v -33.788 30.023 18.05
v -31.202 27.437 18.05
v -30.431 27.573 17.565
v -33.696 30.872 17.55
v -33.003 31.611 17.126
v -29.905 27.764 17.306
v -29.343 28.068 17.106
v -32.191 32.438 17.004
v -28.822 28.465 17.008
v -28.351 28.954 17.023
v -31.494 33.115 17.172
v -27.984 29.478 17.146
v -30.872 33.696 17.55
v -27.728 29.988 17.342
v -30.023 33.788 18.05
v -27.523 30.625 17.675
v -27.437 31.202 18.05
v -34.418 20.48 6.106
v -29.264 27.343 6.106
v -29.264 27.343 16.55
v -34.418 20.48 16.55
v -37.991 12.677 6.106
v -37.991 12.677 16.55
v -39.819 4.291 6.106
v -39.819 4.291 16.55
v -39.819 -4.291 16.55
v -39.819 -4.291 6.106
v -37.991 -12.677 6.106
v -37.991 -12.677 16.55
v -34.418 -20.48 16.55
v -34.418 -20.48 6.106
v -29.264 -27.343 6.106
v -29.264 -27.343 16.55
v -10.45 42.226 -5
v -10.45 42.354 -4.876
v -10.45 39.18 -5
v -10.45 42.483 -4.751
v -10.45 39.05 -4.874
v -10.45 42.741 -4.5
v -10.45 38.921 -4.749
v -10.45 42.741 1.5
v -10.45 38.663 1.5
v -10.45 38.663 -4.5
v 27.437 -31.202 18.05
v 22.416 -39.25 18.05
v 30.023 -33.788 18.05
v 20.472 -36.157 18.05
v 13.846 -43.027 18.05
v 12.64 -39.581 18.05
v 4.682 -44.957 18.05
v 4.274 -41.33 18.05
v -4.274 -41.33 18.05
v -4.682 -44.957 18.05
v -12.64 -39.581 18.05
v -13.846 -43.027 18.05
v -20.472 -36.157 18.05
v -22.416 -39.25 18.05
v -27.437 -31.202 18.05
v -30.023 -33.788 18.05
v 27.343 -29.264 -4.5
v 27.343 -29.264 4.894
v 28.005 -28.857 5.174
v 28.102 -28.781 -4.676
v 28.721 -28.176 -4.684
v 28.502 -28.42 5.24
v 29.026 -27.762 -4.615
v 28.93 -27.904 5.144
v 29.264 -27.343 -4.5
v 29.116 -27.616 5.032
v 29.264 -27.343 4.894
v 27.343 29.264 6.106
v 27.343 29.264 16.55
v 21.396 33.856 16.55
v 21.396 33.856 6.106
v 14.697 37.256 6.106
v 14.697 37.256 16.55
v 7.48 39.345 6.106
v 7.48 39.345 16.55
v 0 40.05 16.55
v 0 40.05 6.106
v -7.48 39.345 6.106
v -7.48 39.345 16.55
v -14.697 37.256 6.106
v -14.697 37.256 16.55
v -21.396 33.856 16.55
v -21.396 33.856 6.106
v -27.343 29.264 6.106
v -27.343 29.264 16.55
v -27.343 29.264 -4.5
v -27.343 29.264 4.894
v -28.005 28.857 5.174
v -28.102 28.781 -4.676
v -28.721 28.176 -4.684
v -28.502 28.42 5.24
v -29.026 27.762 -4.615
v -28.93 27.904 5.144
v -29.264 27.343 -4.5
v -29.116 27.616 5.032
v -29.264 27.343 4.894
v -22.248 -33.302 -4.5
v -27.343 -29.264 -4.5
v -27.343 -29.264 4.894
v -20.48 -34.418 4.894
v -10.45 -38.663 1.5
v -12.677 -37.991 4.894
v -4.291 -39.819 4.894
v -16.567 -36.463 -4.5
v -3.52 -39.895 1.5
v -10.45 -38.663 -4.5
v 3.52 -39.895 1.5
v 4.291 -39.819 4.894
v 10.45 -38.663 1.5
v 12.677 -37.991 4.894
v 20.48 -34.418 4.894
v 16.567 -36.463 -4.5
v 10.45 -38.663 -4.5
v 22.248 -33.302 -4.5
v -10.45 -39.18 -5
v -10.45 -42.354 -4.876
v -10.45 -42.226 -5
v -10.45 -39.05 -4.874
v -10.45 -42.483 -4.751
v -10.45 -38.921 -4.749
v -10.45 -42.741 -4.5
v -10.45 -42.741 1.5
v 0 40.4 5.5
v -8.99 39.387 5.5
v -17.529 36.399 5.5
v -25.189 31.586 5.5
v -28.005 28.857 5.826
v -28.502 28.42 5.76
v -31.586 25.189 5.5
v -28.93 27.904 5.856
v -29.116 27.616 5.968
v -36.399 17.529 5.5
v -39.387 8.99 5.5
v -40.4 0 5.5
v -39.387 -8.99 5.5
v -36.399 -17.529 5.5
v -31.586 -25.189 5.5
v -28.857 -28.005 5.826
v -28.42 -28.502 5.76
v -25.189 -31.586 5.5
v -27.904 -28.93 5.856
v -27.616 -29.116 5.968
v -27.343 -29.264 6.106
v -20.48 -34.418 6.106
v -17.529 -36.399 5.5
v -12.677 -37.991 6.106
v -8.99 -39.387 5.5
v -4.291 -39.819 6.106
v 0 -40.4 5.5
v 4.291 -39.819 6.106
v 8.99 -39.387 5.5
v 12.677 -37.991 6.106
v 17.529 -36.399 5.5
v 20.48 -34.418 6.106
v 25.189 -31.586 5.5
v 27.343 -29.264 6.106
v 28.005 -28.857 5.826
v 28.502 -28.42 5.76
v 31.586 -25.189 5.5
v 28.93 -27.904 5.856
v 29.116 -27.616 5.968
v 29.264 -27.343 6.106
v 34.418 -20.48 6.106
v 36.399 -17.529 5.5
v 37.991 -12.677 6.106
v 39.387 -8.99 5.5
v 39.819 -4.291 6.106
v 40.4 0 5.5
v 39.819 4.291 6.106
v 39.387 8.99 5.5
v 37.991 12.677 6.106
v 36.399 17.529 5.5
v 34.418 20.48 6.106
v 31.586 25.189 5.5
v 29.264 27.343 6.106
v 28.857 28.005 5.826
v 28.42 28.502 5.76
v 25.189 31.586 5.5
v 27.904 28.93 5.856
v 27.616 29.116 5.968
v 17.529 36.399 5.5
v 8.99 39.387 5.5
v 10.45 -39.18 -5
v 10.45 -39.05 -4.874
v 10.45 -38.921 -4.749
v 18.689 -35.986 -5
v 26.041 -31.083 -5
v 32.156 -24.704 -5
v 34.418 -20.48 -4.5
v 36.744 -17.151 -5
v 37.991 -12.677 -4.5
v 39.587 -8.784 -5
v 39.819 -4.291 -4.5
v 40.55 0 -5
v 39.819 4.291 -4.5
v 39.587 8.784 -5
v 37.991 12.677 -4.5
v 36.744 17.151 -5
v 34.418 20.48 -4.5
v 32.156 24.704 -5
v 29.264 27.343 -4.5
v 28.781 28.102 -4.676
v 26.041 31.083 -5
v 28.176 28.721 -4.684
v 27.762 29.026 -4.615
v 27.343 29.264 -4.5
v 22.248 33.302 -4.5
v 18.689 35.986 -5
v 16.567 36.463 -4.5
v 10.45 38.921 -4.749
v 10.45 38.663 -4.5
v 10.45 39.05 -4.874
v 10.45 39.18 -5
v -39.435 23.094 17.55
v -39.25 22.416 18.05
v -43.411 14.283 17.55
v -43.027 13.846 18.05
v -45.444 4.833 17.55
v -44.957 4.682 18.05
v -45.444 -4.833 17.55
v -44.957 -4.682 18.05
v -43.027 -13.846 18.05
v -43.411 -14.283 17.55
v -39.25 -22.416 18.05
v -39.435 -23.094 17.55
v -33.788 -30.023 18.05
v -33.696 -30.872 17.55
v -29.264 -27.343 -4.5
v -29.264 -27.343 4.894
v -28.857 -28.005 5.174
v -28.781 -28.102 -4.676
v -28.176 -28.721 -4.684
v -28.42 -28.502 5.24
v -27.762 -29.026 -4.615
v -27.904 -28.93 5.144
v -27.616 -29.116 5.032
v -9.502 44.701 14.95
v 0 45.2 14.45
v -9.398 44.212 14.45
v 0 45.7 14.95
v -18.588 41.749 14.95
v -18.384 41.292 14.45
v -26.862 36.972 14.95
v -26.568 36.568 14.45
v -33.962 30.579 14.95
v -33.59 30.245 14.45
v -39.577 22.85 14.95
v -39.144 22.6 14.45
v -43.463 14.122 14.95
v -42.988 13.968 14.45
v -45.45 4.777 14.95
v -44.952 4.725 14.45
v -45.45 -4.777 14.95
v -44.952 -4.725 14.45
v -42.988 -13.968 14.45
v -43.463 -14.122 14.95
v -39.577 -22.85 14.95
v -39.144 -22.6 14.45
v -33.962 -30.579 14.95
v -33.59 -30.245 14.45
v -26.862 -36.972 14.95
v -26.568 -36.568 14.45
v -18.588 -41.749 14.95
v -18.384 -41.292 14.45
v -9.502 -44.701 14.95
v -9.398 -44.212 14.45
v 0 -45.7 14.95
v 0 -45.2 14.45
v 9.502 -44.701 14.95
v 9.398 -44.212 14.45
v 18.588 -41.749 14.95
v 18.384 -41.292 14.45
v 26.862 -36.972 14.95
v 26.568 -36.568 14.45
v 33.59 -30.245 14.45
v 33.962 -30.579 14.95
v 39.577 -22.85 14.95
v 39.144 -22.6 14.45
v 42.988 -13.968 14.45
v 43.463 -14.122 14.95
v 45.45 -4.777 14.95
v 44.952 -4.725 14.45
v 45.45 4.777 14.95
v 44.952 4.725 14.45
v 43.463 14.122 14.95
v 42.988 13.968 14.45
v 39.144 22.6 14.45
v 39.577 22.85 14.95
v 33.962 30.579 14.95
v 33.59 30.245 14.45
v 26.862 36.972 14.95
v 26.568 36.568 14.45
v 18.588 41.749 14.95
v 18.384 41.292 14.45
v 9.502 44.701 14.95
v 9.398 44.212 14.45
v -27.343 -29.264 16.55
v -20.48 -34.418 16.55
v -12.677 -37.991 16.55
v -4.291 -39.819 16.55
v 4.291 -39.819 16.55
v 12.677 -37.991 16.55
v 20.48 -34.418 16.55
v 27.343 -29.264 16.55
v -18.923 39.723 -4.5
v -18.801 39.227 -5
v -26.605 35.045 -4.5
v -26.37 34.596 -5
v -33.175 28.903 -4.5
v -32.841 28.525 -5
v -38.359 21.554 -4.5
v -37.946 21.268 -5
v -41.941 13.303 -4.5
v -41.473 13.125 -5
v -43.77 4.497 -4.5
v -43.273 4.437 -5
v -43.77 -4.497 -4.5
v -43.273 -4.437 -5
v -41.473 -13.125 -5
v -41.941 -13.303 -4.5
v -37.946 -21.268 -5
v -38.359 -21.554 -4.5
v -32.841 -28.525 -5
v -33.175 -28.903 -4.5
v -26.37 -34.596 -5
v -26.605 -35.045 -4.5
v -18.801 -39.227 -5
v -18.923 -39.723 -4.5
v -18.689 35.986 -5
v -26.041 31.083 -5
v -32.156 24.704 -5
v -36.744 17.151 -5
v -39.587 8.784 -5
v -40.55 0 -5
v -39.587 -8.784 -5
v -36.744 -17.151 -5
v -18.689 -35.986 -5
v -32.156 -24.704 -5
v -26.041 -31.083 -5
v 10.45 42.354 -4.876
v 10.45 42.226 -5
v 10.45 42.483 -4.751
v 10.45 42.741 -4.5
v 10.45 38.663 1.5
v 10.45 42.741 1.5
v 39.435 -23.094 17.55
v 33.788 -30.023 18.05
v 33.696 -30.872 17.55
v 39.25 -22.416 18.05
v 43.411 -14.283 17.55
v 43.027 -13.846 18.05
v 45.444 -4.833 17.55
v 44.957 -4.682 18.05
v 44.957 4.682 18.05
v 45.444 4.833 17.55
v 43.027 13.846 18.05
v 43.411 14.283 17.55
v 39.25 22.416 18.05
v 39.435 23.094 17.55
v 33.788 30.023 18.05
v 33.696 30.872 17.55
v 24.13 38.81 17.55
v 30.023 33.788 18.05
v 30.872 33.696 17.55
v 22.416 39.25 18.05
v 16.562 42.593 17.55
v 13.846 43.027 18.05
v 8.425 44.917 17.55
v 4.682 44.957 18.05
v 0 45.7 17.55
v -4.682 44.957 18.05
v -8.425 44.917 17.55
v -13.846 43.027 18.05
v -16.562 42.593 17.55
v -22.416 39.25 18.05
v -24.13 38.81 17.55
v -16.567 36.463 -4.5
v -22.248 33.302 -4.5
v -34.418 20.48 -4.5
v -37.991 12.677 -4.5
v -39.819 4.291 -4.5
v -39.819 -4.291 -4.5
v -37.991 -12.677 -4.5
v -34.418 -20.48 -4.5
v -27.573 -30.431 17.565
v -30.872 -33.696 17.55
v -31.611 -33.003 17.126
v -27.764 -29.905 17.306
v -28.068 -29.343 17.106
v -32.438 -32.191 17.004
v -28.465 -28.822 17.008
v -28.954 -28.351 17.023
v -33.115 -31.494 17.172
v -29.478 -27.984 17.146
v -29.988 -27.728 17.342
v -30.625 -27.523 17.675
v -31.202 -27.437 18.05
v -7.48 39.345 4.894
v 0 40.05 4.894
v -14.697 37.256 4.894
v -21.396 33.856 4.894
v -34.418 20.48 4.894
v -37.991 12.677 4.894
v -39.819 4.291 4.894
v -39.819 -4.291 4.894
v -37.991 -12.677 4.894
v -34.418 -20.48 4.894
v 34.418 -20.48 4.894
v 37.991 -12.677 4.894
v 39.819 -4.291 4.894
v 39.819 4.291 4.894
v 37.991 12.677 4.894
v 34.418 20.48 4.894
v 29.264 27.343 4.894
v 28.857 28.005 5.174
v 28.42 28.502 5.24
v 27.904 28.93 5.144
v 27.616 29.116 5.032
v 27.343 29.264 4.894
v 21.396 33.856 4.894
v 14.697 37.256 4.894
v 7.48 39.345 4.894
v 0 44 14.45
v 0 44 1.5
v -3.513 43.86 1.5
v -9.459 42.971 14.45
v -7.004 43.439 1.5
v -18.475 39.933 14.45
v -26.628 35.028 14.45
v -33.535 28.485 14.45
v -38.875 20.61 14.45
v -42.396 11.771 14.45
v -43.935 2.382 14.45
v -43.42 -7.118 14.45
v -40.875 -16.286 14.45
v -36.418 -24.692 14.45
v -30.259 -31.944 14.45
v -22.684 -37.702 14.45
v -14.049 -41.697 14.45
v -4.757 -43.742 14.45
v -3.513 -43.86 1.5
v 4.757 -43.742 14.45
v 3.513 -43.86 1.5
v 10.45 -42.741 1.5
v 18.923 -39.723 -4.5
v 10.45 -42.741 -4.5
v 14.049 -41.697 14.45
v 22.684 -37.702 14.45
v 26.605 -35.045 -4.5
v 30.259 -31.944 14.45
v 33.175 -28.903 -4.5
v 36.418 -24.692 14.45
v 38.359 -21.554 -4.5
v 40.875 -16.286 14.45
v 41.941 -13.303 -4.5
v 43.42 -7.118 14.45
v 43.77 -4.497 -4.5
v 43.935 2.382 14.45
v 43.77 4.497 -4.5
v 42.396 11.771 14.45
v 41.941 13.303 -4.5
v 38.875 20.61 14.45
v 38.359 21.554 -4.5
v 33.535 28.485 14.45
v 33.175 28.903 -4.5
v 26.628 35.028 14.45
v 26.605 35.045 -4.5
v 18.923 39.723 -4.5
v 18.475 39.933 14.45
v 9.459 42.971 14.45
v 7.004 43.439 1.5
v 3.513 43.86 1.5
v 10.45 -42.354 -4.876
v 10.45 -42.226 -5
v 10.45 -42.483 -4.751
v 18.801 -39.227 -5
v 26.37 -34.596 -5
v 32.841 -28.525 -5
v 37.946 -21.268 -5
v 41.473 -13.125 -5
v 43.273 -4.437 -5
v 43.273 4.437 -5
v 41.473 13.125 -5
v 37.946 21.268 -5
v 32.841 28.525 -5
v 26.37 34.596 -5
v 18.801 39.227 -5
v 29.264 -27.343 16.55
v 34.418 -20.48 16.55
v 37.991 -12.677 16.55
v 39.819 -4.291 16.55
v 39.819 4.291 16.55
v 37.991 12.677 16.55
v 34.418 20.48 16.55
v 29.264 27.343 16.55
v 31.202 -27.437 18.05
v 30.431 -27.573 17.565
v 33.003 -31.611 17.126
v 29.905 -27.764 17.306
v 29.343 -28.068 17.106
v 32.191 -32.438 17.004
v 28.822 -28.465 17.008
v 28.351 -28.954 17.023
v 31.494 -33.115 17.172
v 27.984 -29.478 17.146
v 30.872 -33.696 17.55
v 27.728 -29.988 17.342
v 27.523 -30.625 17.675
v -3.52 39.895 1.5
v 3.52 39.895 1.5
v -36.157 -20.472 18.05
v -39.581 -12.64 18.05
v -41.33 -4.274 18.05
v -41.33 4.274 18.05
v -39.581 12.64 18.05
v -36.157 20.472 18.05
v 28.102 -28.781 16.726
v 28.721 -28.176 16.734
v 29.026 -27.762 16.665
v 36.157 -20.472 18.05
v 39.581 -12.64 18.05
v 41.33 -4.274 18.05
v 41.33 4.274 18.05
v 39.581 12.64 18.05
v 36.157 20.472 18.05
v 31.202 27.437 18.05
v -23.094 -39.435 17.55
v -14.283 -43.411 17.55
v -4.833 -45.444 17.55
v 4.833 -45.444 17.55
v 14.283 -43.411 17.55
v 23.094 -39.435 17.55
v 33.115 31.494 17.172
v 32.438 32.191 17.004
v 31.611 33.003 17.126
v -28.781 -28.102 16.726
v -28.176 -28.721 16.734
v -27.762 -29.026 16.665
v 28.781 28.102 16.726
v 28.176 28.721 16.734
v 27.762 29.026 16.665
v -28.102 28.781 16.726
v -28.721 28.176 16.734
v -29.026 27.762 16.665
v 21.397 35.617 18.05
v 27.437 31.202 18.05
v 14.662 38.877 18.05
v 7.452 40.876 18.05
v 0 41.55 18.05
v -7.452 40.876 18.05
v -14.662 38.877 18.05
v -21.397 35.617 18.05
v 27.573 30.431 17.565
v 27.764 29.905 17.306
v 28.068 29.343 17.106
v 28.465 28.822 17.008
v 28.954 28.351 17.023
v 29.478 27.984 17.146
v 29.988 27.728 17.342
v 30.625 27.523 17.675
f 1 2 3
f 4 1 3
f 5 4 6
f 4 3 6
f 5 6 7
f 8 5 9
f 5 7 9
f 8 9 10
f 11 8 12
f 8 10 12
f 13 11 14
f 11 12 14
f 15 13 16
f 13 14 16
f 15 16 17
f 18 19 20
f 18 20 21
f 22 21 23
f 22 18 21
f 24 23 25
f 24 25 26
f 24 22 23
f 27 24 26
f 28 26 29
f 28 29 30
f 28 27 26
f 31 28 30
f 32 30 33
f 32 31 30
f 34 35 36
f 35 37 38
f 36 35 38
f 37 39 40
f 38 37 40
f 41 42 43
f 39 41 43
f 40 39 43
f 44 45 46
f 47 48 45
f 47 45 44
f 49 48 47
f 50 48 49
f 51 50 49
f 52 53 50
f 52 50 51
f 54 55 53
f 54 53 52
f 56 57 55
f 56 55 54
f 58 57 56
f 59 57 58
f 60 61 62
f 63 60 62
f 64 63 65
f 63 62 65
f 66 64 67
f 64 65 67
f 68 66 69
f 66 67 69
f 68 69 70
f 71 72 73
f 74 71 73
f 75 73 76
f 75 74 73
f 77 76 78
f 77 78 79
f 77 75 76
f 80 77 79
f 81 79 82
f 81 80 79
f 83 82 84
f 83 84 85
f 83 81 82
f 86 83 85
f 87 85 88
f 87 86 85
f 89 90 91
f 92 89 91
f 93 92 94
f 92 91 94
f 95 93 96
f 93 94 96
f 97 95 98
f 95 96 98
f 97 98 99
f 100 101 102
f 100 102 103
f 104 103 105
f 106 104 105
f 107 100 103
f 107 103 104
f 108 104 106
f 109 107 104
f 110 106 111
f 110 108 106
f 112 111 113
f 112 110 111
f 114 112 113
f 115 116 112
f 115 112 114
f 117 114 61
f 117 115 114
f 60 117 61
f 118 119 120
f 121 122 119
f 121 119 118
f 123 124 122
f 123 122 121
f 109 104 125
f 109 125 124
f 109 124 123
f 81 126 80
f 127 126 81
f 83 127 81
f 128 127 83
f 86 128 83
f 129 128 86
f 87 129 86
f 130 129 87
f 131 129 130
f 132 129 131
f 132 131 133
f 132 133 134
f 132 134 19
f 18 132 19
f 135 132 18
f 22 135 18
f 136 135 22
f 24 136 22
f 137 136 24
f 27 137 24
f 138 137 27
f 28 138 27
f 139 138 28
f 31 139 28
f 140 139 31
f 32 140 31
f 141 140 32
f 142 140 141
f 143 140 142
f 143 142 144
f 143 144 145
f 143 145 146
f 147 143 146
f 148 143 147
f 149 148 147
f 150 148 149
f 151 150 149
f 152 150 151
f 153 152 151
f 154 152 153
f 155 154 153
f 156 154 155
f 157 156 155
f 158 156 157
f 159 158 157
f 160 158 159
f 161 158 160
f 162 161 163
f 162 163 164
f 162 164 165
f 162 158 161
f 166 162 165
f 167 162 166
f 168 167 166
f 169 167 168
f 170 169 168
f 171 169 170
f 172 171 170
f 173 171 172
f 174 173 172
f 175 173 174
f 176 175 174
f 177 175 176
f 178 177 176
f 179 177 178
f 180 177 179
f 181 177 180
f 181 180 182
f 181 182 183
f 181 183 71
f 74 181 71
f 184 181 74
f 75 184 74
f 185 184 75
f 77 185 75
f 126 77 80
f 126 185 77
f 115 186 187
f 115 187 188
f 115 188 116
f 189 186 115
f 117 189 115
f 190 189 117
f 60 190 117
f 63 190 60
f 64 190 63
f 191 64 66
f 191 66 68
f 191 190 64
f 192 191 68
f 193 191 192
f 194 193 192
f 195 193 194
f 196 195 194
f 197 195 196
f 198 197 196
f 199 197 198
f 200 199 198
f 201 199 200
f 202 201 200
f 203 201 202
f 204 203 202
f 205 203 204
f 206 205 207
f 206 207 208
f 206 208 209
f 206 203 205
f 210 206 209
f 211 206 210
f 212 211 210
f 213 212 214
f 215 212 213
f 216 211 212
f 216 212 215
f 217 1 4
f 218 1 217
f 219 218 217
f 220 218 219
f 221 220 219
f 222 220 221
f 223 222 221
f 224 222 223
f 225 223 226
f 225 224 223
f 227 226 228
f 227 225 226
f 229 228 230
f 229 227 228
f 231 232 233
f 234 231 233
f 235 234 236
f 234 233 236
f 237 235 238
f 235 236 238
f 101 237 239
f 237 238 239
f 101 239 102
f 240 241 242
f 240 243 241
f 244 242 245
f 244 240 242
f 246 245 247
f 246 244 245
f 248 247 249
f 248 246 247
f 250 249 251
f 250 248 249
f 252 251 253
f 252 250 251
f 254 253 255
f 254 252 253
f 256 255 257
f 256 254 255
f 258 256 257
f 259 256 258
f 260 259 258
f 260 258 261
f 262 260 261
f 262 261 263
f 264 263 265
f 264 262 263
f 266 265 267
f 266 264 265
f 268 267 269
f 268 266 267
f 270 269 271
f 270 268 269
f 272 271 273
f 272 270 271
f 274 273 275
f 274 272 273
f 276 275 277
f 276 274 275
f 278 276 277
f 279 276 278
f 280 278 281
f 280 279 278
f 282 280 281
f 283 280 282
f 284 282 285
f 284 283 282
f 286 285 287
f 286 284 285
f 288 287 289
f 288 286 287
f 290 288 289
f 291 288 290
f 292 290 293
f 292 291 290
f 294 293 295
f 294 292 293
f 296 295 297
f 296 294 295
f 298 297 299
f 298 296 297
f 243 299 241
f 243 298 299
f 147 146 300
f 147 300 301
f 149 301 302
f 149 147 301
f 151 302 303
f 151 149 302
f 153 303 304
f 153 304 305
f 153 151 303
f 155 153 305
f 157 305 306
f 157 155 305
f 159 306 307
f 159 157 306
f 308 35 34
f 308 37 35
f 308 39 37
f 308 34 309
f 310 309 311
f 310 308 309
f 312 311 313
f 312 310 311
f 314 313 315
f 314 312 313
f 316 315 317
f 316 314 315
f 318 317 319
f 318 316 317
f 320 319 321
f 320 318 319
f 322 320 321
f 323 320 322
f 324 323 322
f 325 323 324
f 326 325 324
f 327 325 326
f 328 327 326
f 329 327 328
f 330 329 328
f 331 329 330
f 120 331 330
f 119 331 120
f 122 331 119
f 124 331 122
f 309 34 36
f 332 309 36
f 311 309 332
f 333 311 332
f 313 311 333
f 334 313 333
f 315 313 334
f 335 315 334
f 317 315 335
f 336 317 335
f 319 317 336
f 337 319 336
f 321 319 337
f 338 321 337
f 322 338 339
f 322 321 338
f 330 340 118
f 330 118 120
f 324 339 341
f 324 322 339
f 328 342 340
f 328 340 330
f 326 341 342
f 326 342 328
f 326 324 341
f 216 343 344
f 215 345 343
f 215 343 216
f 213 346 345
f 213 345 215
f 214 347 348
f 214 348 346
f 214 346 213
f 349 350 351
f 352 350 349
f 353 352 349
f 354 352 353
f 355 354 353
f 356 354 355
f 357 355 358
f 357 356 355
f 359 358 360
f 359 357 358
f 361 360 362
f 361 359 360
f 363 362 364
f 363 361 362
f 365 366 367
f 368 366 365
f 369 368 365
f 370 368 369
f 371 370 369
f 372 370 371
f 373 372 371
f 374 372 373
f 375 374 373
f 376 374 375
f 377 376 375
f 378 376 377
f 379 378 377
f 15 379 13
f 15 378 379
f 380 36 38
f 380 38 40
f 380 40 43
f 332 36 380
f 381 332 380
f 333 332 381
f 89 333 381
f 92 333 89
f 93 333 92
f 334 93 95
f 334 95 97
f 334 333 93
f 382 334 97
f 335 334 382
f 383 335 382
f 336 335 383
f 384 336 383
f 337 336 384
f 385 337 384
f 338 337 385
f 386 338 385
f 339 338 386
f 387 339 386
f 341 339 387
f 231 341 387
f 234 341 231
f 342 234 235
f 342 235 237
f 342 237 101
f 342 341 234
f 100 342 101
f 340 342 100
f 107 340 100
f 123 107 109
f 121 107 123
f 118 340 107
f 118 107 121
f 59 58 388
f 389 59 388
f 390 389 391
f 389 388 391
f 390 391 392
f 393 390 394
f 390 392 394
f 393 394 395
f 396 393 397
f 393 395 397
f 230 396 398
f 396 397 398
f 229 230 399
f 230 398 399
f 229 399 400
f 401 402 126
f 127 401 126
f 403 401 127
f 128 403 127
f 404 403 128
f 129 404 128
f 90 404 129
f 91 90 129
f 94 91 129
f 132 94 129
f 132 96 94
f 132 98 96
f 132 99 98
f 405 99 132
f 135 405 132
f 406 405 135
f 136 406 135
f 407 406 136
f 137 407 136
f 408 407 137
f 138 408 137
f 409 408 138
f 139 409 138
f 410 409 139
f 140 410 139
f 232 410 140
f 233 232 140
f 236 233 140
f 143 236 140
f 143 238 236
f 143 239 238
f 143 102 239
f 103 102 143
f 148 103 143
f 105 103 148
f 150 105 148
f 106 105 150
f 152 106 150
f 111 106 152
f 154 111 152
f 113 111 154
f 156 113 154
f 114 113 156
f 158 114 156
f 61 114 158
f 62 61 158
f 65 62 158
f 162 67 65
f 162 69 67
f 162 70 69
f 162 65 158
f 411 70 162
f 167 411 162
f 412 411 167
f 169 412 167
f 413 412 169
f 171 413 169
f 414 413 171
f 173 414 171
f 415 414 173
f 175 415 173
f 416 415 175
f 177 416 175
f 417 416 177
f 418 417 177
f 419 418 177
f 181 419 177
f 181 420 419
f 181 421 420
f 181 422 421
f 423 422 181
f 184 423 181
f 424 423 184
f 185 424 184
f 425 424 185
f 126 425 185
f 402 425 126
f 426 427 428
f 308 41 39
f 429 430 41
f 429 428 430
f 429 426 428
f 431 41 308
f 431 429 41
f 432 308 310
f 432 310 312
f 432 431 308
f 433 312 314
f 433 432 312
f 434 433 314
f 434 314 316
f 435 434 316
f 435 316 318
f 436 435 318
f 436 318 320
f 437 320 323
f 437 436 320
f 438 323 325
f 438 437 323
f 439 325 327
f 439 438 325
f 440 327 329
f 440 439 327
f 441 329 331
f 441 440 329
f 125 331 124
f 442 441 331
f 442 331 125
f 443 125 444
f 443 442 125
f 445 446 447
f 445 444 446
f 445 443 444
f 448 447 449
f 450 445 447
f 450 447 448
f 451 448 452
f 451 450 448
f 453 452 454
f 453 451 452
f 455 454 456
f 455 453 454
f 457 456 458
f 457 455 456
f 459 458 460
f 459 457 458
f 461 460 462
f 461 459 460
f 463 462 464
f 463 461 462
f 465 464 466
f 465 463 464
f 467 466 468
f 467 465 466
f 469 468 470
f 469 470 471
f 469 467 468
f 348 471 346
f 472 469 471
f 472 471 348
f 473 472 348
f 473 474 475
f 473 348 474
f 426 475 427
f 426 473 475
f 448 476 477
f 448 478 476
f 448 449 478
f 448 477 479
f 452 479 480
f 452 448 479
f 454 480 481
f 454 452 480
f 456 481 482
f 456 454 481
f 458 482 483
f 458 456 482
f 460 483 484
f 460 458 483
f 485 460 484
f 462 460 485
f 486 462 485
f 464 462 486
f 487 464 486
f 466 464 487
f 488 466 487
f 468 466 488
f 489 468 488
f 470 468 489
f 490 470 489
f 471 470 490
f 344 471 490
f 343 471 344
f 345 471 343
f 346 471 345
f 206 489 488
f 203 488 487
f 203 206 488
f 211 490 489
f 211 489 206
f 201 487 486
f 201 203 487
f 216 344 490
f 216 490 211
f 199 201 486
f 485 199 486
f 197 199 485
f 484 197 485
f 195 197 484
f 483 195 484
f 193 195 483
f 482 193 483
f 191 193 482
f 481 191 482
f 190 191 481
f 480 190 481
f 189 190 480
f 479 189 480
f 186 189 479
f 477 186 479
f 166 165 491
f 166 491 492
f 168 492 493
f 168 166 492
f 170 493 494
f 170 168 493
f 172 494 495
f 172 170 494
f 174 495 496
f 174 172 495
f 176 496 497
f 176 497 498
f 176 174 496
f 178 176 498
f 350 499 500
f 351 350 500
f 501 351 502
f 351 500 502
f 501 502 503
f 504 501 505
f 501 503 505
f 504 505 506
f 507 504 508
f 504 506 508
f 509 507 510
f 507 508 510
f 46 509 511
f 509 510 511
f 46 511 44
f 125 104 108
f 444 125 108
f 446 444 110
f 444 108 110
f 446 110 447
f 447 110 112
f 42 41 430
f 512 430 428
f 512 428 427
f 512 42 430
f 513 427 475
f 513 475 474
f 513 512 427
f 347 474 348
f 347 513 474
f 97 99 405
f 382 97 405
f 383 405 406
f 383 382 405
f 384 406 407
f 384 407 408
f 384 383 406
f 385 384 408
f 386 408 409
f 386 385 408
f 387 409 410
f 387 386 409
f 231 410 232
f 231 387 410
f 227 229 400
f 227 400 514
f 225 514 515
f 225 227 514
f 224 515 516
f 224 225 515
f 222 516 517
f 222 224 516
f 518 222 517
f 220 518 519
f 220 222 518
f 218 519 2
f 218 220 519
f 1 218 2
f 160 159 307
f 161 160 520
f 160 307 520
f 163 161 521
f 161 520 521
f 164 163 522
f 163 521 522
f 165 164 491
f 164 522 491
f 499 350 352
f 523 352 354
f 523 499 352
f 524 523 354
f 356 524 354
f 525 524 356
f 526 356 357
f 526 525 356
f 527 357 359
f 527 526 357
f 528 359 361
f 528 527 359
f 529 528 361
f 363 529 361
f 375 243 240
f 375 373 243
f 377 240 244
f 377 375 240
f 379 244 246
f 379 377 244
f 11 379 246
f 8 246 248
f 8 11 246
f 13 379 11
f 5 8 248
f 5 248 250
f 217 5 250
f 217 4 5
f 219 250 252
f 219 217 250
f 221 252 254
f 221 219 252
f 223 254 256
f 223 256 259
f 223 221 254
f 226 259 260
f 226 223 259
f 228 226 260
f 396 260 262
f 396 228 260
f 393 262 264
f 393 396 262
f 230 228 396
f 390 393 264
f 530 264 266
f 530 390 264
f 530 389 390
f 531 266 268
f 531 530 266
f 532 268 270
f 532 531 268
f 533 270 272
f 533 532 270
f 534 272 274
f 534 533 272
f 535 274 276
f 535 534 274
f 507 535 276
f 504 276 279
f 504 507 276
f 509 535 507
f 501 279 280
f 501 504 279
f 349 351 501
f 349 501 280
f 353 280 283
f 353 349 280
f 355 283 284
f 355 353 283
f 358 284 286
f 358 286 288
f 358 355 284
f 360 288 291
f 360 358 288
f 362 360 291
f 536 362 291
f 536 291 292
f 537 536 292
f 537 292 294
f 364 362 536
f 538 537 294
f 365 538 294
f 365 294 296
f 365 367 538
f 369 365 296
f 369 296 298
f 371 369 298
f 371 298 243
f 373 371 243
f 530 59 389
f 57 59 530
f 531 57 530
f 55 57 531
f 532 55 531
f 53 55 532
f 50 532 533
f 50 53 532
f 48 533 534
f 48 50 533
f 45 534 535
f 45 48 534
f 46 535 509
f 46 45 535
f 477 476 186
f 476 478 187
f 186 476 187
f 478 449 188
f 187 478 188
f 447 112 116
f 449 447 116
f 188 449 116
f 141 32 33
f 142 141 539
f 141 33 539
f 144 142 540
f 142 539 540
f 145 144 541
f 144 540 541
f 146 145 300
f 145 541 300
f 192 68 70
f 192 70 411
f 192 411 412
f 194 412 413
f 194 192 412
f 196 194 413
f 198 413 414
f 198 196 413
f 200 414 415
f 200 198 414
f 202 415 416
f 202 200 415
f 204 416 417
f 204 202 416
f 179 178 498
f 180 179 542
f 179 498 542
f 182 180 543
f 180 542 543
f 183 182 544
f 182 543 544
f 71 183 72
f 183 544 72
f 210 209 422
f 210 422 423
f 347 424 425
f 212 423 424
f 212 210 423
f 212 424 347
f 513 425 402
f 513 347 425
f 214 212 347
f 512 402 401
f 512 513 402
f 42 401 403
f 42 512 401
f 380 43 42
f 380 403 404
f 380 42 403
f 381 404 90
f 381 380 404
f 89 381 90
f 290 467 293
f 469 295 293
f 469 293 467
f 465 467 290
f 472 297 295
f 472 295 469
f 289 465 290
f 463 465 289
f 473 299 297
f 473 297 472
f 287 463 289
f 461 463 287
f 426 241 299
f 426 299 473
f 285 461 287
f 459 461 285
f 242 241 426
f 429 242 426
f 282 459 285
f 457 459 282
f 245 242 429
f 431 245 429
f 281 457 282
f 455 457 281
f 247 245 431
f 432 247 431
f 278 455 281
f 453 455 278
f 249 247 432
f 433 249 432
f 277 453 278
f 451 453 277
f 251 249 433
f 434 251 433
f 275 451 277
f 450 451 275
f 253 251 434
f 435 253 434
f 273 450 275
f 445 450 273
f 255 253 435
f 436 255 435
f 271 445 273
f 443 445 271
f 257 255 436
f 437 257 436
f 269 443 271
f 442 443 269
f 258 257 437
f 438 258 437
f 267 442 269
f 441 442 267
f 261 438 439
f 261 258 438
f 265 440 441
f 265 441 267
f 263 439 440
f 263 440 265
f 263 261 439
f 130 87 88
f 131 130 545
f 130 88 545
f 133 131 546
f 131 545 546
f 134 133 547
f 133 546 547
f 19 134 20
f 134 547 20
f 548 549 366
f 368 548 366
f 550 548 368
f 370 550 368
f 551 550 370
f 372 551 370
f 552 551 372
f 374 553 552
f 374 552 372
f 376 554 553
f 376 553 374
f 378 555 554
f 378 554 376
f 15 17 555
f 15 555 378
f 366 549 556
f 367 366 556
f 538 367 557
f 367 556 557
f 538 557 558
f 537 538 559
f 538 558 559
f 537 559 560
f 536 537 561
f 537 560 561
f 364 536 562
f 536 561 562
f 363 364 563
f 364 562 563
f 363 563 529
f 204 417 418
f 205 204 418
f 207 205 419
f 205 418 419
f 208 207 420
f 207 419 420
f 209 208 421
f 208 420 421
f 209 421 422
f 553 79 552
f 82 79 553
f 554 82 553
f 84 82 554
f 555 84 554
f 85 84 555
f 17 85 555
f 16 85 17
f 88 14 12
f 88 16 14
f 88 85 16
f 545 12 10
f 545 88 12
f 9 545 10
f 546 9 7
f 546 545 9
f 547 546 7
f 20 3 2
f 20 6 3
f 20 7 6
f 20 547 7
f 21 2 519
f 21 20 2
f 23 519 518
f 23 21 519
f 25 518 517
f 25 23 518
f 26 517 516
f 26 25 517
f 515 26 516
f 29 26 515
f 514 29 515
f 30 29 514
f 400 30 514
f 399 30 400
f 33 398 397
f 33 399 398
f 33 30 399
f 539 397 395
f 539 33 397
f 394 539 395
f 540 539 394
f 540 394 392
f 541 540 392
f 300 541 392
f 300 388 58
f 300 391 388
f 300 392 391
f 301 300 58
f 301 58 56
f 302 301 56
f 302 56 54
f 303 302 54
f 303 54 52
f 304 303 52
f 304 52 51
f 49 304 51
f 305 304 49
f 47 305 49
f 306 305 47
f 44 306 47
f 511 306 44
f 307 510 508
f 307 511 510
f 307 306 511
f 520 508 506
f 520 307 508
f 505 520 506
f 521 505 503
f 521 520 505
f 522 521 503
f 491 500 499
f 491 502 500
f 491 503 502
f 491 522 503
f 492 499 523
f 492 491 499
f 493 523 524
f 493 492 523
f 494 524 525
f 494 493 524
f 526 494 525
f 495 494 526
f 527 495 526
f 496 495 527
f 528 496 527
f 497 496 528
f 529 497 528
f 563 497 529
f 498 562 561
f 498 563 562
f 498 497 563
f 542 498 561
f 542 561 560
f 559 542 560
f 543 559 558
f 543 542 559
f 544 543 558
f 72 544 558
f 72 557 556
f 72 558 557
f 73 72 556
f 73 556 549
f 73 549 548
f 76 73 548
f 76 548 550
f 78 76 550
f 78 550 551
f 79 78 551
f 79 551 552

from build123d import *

# Parameters (mm, degrees)
SKETCH33_MESH_154_R                  = 4.25
CUT_EXTRUDE1_DEPTH                   = 69.616925755
SKETCH34_MESH_158_R                  = 3.9
EXTRUDE21_CUT_159_DEPTH              = 22.5
CIRPATTERN1_COUNT                    = 4
CUT_EXTRUDE11_REACH                  = 69.103
CUT_EXTRUDE11_END_RADIUS             = 44
SKETCH35_MESH_161_W                  = 20.9
SKETCH35_MESH_161_H                  = 6.5
CUT_EXTRUDE11_DIRECTION_2_REACH      = 69.103
CUT_EXTRUDE11_DIRECTION_2_END_RADIUS = 44


with BuildPart() as part:
    # Sketch32 (Mesh)_152 → Revolve1 (revolve)
    with BuildSketch(Plane(origin=(0, 0, 0), x_dir=(0, 0, -1), z_dir=(1, 0, 0)), mode=Mode.PRIVATE) as revolve1_sk:
        Polygon((-16.55, -40.05), (-6.106217783, -40.05), (-5.5, -40.4), (-4.893782217, -40.05), (4.5, -40.05), (5, -40.55), (5, -43.5), (4.5, -44), (-14.45, -44), (-14.45, -45.2), (-14.95, -45.7), (-17.55, -45.7), (-18.05, -45.2), (-18.05, -41.55), align=None)
    revolve(revolve1_sk.sketch.rotate(Axis((0, 0, 0), (0, 0, 1)), 180), axis=Axis((0, 0, 0), (0, 0, 1)))

    # Sketch33 (Mesh)_154 → Cut-Extrude1 (cut, through all)
    with BuildSketch(Plane.XY.offset(18.05)):
        with Locations((-25.455844123, 25.455844123)):
            Circle(SKETCH33_MESH_154_R)
    cut_extrude1 = extrude(amount=-CUT_EXTRUDE1_DEPTH, mode=Mode.SUBTRACT)

    # Sketch34 (Mesh)_158 → Extrude21 (Cut)_159 (cut, symmetric)
    with BuildSketch(Plane(origin=(-28.319626587, 28.319626587, 0), x_dir=(-0.7071067811865464, -0.7071067811865488, 0), z_dir=(0.7071067811865488, -0.7071067811865464, 0))):
        with Locations((0, -20.9)):
            Circle(SKETCH34_MESH_158_R)
    extrude21_cut_159 = extrude(amount=EXTRUDE21_CUT_159_DEPTH, both=True, mode=Mode.SUBTRACT)

    # CirPattern1: Cut-Extrude1, Extrude21 (Cut)_159 ×4 about axis
    cirpattern1_axis = Axis((0, 0, 0), (0, 0, 1))
    add([cut_extrude1.rotate(cirpattern1_axis, i * 360 / CIRPATTERN1_COUNT) for i in range(1, CIRPATTERN1_COUNT)], mode=Mode.SUBTRACT)
    add([extrude21_cut_159.rotate(cirpattern1_axis, i * 360 / CIRPATTERN1_COUNT) for i in range(1, CIRPATTERN1_COUNT)], mode=Mode.SUBTRACT)

    # Cut-Extrude11: up to this cylinder (the profile starts inside it)
    cut_extrude11_end = Plane(origin=(0, 0, -1.75), z_dir=(0, 0, -1)) * Cylinder(CUT_EXTRUDE11_END_RADIUS, 227.206, mode=Mode.PRIVATE)
    # Sketch35 (Mesh)_161 → Cut-Extrude11 (cut, up to the surface)
    with BuildSketch(Plane(origin=(0, 0, 0), x_dir=(1, 0, 0), z_dir=(0, 1, 0)), mode=Mode.PRIVATE) as cut_extrude11_sk1:
        with Locations((0, 1.75)):
            Rectangle(SKETCH35_MESH_161_W, SKETCH35_MESH_161_H)
    cut_extrude11_tool1 = extrude(cut_extrude11_sk1.sketch, amount=CUT_EXTRUDE11_REACH, mode=Mode.PRIVATE) & cut_extrude11_end
    add(cut_extrude11_tool1.solids().sort_by_distance((0, 0, -1.75))[0], mode=Mode.SUBTRACT)

    # Cut-Extrude11 direction 2: up to this cylinder (the profile starts inside it)
    cut_extrude11_direction_2_end = Plane(origin=(0, 0, -1.75), z_dir=(0, 0, -1)) * Cylinder(CUT_EXTRUDE11_DIRECTION_2_END_RADIUS, 227.206, mode=Mode.PRIVATE)
    # Sketch35 (Mesh)_161 → Cut-Extrude11 direction 2 (cut, up to the surface)
    with BuildSketch(Plane(origin=(0, 0, 0), x_dir=(1, 0, 0), z_dir=(0, 1, 0)), mode=Mode.PRIVATE) as cut_extrude11_direction_2_sk1:
        with Locations((0, 1.75)):
            Rectangle(SKETCH35_MESH_161_W, SKETCH35_MESH_161_H)
    cut_extrude11_direction_2_tool1 = extrude(cut_extrude11_direction_2_sk1.sketch, amount=-CUT_EXTRUDE11_DIRECTION_2_REACH, mode=Mode.PRIVATE) & cut_extrude11_direction_2_end
    add(cut_extrude11_direction_2_tool1.solids().sort_by_distance((0, 0, -1.75))[0], mode=Mode.SUBTRACT)


solid = part.part
